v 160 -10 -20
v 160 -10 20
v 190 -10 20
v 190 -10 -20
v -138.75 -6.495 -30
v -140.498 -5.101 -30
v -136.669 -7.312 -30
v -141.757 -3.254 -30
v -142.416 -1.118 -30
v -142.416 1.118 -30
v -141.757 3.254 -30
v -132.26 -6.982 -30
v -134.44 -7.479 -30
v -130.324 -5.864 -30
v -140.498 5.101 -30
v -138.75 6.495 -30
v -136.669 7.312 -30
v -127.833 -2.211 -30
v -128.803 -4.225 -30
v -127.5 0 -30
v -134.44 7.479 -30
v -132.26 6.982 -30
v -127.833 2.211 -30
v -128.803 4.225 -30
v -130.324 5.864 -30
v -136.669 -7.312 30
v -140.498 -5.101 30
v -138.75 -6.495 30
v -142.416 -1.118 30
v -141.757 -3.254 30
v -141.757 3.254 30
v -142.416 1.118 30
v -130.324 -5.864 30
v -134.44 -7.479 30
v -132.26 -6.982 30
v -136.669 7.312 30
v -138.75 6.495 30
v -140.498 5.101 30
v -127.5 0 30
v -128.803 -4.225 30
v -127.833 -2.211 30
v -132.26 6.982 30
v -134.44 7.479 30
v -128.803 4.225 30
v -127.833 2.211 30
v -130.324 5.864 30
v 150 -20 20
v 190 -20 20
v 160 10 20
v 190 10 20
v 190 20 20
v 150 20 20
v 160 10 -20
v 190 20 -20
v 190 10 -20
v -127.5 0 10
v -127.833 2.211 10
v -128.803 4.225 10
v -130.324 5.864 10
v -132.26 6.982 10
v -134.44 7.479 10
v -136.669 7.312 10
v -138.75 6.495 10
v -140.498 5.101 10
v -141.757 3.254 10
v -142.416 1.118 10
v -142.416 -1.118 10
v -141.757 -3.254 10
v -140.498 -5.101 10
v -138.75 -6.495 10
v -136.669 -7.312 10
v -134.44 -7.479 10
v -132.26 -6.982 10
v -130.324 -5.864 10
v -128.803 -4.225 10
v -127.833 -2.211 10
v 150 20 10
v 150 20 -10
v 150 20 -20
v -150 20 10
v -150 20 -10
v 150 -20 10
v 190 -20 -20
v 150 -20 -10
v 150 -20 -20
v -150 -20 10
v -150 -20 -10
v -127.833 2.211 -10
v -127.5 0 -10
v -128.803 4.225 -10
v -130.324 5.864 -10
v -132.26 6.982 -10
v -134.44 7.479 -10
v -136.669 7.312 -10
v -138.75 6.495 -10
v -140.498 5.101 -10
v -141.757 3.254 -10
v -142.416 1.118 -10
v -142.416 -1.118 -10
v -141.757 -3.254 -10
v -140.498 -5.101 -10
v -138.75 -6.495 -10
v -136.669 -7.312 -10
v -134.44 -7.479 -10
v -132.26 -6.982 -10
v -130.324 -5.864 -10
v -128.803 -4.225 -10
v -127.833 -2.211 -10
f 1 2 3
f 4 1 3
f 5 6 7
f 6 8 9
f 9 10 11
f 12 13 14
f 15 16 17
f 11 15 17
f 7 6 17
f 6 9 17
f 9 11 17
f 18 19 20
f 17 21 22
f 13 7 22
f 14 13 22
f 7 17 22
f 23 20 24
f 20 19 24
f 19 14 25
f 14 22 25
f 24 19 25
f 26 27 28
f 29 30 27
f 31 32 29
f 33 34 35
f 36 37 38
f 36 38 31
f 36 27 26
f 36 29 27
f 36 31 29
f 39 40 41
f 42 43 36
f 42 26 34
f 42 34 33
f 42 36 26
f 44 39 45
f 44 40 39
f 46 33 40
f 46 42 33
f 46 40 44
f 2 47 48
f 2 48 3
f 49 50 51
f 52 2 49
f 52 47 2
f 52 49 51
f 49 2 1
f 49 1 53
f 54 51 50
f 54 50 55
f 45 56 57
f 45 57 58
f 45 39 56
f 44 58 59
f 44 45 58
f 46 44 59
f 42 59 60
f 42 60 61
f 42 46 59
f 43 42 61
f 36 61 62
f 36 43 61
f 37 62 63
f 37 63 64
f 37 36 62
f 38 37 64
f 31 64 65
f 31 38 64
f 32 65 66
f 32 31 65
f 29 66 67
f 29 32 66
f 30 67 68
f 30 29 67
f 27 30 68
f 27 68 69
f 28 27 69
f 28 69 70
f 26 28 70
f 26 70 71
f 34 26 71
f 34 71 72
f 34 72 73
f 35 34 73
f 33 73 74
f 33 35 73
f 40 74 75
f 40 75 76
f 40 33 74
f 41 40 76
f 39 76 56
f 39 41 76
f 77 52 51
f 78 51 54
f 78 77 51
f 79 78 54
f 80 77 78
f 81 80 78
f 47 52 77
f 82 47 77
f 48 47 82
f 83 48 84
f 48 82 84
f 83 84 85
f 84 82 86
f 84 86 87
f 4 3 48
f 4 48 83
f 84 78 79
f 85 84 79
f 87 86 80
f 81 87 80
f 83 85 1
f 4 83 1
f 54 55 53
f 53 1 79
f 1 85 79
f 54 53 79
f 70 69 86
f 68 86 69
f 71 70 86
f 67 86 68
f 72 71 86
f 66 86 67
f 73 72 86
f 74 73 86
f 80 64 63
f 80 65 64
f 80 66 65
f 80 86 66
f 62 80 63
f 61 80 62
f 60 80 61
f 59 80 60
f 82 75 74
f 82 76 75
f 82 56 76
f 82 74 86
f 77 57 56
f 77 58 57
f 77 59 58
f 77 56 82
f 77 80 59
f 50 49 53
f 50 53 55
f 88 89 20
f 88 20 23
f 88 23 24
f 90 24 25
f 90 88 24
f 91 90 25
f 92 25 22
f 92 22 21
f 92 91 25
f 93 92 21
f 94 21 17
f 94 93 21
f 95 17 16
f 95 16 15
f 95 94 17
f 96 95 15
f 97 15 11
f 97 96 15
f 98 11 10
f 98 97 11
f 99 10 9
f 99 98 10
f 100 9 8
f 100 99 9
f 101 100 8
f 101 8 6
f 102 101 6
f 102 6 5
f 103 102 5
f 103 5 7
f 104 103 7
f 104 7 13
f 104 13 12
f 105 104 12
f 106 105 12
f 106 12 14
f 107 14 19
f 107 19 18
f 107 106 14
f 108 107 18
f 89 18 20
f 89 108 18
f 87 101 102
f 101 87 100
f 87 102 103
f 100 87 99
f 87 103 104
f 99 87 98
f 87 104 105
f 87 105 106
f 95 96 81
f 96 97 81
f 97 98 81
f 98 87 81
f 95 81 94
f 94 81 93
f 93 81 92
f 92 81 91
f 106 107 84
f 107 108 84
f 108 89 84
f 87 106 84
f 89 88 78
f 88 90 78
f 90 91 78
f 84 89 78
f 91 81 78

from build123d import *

# Parameters (mm, degrees)
SKETCH1_W           = 300
SKETCH1_H           = 40
BOSS_EXTRUDE1_DEPTH = 10
SKETCH2_R           = 7.5
BOSS_EXTRUDE2_DEPTH = 30
SKETCH3_W           = 40
SKETCH3_H           = 40
BOSS_EXTRUDE3_DEPTH = 40
SKETCH4_W           = 60
SKETCH4_H           = 20
CUT_EXTRUDE1_DEPTH  = 58


with BuildPart() as part:
    # Sketch1 → Boss-Extrude1 (new, symmetric)
    with BuildSketch(Plane.XY):
        Rectangle(SKETCH1_W, SKETCH1_H)
    extrude(amount=BOSS_EXTRUDE1_DEPTH, both=True)

    # Sketch2 → Boss-Extrude2 (add, symmetric)
    with BuildSketch(Plane.XY):
        with Locations((-135, 0)):
            Circle(SKETCH2_R)
    extrude(amount=BOSS_EXTRUDE2_DEPTH, both=True)

    # Sketch3 → Boss-Extrude3 (add)
    with BuildSketch(Plane(origin=(150, 0, 0), x_dir=(0, 0, -1), z_dir=(1, 0, 0))):
        Rectangle(SKETCH3_W, SKETCH3_H)
    extrude(amount=BOSS_EXTRUDE3_DEPTH)

    # Sketch4 → Cut-Extrude1 (cut)
    with BuildSketch(Plane.XY.offset(20)):
        with Locations((190, 0)):
            Rectangle(SKETCH4_W, SKETCH4_H)
    extrude(amount=-CUT_EXTRUDE1_DEPTH, mode=Mode.SUBTRACT)


solid = part.part
